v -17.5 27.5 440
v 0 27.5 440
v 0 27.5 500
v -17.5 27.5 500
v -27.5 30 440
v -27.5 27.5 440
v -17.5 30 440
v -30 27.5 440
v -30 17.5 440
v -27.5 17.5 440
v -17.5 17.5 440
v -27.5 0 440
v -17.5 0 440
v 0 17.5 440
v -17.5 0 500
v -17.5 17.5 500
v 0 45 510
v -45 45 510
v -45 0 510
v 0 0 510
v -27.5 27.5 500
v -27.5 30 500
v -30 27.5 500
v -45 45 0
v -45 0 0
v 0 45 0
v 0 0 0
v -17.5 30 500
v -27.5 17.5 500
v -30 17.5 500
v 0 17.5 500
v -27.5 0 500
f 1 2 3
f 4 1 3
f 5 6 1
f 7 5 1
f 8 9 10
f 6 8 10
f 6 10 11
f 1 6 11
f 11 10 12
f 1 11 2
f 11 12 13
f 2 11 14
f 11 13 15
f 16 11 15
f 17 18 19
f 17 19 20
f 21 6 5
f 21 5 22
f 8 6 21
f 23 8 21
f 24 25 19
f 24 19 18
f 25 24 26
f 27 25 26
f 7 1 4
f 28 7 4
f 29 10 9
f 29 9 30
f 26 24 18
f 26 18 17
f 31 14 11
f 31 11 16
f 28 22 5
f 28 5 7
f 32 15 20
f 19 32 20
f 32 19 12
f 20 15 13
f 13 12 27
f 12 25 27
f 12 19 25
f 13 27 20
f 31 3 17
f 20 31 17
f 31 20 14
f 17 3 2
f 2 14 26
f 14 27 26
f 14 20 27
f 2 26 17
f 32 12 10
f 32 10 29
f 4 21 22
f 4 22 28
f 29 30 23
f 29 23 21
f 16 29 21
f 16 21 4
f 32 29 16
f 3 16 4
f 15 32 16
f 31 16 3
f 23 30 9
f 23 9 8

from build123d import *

# Parameters (mm, degrees)
F0_W     = 45
F0_H     = 45
F1_DEPTH = 510
F2_W     = 10
F2_H     = 60
F4_DEPTH = 30
F3_W     = 10
F3_H     = 60
F5_DEPTH = 30


with BuildPart() as f1:
    # F0 (on Top) → F1 (new body)
    with BuildSketch(Plane.XY):
        with Locations((-22.5, 22.5)):
            Rectangle(F0_W, F0_H)
    extrude(amount=F1_DEPTH)

    # F2 (on face) → F4 (cut)
    with BuildSketch(Plane.YZ):
        with Locations((22.5, 470)):
            Rectangle(F2_W, F2_H)
    extrude(amount=-F4_DEPTH, mode=Mode.SUBTRACT)

    # F3 (on face) → F5 (cut)
    with BuildSketch(Plane.XZ):
        with Locations((-22.5, 470)):
            Rectangle(F3_W, F3_H)
    extrude(amount=-F5_DEPTH, mode=Mode.SUBTRACT)


solid = f1.part
